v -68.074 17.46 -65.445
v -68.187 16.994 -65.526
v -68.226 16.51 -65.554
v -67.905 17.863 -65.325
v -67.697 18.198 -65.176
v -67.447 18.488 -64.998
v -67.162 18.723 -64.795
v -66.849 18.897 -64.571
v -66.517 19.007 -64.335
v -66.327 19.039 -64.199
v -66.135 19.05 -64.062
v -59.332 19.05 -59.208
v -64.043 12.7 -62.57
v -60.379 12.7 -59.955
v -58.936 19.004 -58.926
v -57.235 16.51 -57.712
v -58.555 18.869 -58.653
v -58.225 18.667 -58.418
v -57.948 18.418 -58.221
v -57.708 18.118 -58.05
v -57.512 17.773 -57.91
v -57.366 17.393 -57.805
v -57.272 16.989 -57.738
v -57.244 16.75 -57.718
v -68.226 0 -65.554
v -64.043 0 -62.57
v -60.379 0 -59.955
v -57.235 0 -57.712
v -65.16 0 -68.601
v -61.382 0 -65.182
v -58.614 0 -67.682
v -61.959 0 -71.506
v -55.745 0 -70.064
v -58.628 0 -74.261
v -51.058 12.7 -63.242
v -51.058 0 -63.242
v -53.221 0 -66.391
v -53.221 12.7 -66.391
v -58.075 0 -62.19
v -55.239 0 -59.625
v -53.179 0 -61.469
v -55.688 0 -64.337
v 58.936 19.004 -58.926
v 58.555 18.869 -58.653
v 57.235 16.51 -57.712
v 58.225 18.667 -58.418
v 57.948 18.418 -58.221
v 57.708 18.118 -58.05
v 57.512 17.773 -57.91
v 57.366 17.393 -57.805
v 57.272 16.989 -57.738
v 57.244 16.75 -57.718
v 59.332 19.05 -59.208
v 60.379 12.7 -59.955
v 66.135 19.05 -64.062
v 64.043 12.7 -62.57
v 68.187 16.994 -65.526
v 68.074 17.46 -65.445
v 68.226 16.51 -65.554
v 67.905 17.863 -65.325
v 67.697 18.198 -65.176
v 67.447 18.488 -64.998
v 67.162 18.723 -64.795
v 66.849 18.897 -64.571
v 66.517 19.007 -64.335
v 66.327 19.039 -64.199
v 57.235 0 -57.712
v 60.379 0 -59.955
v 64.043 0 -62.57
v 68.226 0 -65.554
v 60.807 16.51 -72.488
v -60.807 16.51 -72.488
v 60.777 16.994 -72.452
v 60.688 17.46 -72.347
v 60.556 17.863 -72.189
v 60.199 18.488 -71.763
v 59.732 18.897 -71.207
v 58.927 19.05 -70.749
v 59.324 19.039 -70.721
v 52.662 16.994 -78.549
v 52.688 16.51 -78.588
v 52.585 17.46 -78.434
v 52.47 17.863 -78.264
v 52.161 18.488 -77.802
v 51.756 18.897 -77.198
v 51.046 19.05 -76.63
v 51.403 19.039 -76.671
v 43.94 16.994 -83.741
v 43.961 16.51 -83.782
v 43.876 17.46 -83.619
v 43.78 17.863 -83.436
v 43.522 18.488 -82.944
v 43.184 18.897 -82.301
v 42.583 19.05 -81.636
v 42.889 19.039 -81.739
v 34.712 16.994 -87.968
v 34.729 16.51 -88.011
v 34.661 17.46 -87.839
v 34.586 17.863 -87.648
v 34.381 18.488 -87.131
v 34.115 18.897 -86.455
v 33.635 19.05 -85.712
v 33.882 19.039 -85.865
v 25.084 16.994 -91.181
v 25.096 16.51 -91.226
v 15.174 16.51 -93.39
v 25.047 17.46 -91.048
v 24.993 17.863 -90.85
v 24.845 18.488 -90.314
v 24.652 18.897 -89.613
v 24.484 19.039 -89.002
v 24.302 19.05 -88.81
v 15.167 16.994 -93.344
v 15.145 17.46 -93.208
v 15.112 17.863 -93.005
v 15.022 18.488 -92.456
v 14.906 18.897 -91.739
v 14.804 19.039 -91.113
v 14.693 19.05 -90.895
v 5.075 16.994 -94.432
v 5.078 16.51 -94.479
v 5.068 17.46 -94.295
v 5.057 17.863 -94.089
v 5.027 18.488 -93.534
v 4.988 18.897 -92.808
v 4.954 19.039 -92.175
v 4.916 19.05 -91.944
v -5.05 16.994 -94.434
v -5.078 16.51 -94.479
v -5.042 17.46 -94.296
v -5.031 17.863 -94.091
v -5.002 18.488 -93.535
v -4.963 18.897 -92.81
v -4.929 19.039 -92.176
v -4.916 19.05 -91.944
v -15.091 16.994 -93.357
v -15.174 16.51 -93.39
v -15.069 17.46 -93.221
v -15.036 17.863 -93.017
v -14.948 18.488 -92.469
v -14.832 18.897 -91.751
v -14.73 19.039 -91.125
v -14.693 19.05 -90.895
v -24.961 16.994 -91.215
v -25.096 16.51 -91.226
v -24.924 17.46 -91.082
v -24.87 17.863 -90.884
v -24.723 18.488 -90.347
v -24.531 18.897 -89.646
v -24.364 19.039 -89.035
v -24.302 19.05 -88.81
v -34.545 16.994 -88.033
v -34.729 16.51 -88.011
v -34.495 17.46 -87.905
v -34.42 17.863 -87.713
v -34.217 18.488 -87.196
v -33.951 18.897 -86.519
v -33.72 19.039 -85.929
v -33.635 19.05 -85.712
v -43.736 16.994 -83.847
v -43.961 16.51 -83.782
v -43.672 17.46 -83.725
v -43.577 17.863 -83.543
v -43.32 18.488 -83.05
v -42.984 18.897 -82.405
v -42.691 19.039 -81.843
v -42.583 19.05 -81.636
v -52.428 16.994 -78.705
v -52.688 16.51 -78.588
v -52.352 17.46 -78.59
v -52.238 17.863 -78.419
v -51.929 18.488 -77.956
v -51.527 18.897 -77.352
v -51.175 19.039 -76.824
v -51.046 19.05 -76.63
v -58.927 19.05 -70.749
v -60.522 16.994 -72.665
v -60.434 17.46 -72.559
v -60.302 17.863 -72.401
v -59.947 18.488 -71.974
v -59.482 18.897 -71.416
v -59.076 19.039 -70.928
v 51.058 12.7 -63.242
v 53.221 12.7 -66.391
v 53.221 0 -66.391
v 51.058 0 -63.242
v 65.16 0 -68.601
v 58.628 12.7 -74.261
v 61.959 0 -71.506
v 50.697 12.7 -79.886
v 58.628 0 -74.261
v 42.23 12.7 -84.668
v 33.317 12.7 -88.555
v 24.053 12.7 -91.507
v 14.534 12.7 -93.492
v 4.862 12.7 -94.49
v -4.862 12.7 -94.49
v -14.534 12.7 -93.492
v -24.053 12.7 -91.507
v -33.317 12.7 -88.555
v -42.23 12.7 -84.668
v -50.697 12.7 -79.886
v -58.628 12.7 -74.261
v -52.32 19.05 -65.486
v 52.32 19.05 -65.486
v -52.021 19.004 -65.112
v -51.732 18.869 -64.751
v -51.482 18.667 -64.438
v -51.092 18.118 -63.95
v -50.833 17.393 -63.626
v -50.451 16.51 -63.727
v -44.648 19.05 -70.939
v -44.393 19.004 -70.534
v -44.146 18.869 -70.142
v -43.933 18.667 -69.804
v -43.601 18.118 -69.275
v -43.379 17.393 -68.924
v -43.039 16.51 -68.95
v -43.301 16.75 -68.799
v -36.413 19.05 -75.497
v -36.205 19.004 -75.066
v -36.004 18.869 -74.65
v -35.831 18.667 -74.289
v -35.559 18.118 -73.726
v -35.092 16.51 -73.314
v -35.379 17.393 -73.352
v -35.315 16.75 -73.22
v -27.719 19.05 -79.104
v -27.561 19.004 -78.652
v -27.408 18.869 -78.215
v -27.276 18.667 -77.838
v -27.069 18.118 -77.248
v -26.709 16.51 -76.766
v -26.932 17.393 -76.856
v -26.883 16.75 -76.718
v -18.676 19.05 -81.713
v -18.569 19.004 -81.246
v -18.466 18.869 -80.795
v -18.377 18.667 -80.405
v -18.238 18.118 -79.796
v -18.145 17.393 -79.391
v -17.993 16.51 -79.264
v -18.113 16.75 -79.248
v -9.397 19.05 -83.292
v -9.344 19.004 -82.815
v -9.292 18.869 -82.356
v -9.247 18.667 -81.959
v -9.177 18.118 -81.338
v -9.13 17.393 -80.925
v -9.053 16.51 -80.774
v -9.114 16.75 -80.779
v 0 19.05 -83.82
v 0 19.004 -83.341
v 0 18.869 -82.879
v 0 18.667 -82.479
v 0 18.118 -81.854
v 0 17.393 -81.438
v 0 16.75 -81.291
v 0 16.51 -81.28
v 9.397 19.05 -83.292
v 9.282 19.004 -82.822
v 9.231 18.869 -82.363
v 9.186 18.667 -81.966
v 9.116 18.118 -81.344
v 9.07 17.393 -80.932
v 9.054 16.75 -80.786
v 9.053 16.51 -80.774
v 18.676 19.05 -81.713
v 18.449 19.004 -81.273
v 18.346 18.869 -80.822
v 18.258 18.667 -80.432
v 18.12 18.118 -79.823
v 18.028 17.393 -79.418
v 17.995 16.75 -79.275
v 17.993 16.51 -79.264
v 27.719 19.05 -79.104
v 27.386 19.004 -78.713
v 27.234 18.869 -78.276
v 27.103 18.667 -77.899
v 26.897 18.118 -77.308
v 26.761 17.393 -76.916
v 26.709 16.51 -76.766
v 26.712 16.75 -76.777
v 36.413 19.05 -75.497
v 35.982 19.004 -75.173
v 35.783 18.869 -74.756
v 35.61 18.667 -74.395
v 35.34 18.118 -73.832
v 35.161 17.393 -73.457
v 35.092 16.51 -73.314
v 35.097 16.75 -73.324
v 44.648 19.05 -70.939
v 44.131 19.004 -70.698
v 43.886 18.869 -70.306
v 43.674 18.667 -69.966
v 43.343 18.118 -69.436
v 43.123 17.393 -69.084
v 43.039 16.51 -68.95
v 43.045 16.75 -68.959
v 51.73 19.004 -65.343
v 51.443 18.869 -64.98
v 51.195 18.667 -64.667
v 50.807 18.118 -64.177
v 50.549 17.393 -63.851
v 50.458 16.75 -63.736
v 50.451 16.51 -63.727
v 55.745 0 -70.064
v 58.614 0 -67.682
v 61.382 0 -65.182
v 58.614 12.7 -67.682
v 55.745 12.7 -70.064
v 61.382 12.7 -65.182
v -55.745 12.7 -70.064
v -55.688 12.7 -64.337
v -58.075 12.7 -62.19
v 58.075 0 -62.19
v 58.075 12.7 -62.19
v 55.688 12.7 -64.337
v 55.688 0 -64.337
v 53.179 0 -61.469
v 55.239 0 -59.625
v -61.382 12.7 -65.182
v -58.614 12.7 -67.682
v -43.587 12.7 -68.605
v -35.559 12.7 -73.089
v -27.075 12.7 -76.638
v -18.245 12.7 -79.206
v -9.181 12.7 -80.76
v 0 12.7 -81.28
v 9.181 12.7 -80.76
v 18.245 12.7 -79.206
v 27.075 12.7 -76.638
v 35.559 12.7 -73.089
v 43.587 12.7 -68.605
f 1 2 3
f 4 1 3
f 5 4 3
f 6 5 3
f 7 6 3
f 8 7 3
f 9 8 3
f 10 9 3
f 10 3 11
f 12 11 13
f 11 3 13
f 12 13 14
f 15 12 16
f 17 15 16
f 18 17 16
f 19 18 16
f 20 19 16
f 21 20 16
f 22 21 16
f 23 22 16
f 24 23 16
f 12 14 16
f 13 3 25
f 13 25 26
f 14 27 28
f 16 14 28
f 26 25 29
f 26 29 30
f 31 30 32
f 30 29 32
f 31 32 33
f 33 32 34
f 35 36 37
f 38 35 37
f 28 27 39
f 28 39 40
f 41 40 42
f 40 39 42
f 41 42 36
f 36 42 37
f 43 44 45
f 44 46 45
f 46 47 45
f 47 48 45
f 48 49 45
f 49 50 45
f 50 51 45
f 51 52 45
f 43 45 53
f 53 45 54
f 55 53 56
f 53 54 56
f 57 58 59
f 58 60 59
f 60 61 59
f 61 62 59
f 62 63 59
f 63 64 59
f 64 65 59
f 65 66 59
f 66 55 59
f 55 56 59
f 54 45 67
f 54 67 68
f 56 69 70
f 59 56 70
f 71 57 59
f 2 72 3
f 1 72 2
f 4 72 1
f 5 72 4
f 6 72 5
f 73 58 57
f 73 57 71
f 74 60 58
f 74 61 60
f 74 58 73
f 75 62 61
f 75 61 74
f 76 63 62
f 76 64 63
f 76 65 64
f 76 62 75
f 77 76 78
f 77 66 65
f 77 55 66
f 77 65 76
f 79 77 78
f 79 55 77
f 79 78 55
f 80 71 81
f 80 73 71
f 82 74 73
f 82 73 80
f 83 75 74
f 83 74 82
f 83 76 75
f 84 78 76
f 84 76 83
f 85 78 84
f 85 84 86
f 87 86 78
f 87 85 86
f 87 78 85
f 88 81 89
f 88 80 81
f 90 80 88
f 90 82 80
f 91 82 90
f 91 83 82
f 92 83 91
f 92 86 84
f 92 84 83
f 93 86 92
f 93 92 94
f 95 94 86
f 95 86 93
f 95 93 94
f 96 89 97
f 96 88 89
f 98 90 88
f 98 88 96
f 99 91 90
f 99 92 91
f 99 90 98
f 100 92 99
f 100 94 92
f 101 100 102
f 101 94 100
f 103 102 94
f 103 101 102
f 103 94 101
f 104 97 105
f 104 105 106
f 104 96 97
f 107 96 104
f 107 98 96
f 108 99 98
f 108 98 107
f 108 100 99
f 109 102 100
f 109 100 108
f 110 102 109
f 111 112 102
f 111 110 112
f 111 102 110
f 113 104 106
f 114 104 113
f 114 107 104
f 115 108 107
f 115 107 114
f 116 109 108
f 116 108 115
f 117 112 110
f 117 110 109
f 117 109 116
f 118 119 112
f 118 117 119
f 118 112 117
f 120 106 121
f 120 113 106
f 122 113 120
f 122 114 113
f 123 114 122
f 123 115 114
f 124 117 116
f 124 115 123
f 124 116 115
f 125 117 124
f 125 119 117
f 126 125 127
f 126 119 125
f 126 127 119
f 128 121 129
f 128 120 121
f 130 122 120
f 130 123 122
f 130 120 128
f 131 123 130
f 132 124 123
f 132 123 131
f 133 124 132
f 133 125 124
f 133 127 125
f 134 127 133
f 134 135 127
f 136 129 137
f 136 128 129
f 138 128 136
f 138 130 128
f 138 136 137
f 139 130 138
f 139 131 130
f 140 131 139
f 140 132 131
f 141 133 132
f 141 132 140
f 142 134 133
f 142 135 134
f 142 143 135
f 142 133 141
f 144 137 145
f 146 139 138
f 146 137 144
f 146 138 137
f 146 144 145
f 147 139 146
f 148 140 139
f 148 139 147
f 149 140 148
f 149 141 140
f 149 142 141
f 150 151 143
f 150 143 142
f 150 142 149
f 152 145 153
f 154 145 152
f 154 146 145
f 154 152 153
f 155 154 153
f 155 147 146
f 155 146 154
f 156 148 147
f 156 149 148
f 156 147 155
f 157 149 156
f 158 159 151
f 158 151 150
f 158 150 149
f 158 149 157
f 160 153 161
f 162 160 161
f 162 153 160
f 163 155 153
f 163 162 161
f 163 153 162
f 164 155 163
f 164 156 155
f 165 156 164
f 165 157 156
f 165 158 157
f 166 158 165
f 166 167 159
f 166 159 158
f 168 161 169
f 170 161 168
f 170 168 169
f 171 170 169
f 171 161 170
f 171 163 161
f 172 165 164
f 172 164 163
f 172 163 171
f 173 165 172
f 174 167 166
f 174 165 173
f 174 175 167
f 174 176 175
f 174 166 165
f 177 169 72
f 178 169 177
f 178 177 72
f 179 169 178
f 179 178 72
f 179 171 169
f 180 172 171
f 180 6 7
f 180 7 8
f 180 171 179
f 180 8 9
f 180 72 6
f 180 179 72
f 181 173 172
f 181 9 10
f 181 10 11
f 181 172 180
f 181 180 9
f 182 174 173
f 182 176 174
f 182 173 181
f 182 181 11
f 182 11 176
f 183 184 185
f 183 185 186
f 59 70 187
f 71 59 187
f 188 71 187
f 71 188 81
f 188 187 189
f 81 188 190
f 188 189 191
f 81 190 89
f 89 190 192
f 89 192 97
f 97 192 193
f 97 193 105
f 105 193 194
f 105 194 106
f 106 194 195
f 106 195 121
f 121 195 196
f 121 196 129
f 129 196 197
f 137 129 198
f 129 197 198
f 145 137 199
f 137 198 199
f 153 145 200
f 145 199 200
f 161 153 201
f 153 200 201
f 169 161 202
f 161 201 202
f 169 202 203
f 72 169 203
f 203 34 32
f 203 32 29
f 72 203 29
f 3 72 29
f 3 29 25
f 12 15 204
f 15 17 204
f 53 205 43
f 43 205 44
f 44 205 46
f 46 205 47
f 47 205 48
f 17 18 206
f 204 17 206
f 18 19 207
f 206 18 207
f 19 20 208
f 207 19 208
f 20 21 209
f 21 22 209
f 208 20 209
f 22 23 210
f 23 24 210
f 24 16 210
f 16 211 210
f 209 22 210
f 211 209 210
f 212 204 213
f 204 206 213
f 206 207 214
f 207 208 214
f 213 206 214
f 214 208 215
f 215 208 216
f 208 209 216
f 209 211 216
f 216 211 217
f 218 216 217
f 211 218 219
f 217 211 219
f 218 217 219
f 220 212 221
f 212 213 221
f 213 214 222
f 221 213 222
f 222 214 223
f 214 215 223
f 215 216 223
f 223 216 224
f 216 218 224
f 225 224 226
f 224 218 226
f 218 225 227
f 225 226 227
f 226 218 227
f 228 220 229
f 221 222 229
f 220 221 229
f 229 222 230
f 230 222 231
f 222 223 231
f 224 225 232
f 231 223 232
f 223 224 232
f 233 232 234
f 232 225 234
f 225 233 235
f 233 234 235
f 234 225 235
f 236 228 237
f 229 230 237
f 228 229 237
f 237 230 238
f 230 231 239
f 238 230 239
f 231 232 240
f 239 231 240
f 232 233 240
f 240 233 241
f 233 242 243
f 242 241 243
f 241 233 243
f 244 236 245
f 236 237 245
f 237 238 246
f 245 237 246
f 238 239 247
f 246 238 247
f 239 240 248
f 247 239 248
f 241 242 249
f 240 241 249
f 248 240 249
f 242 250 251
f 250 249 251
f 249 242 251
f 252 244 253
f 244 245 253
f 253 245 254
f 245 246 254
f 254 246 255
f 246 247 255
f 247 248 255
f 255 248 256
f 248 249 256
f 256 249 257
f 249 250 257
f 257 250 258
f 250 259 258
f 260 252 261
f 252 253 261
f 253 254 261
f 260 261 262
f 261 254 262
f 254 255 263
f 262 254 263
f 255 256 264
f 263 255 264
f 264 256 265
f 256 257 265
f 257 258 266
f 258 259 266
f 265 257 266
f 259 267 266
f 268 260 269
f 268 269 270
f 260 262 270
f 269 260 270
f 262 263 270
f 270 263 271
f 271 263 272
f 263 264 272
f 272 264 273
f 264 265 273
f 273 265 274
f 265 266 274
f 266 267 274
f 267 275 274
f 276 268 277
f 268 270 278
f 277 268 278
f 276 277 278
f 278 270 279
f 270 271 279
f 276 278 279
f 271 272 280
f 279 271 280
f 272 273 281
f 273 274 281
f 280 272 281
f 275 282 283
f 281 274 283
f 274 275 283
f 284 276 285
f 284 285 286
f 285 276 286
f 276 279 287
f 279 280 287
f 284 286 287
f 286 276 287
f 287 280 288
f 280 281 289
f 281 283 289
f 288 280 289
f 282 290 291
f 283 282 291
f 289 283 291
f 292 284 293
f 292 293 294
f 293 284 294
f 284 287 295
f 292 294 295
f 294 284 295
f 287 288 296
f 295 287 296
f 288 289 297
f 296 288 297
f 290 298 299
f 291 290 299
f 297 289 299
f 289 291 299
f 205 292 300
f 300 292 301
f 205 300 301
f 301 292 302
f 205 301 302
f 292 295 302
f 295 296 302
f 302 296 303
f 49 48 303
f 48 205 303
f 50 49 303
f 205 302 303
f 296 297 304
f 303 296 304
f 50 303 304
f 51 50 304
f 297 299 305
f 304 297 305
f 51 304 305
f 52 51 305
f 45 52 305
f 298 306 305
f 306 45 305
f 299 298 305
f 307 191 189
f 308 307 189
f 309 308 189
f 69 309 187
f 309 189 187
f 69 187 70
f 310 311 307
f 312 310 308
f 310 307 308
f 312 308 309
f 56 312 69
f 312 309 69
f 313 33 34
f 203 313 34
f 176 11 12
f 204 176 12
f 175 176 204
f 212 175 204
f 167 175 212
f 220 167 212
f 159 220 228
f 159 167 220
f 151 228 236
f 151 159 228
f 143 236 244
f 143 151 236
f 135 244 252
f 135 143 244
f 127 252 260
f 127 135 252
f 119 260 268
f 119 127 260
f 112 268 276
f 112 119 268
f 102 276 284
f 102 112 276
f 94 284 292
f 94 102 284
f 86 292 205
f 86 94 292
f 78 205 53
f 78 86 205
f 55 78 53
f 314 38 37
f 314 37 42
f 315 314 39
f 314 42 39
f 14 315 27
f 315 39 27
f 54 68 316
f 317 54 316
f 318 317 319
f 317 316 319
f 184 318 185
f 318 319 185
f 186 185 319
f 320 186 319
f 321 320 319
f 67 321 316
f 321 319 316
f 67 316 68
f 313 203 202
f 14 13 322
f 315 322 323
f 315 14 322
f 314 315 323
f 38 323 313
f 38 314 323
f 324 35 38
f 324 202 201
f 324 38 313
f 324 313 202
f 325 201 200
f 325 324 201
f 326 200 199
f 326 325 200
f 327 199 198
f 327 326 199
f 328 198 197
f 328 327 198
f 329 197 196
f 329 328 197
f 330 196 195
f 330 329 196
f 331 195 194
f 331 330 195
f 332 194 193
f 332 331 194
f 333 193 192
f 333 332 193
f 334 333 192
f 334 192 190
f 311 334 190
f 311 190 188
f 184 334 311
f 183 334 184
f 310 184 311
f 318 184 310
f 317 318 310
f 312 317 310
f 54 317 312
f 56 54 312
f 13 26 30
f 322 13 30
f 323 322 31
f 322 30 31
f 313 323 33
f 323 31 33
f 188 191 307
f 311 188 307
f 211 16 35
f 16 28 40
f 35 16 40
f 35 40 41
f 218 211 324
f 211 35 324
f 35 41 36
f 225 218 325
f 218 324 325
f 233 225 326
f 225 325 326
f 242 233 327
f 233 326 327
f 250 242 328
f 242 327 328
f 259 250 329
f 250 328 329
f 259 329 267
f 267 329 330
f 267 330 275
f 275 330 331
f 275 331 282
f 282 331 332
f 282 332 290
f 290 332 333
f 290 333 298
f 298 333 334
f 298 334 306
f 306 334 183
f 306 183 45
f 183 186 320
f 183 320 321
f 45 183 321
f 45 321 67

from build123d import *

# Parameters (mm, degrees)
BOSS_EXTRUDE1_DEPTH = 19.05
CUT_EXTRUDE1_DEPTH  = 12.7
FILLET1_R           = 2.54
CUT_EXTRUDE2_DEPTH  = 12.7


with BuildPart() as part:
    # Sketch1 → Boss-Extrude1 (new body)
    with BuildSketch(Plane(origin=(0, 0, 0), x_dir=(1, 0, 0), z_dir=(0, 1, 0))):
        with BuildLine():
            Line((57.234735331, 57.711554056), (68.22559355, 65.553540024))
            ThreePointArc((68.22559355, 65.553540024), (0, 94.615), (-68.22559355, 65.553540024))
            Line((-68.22559355, 65.553540024), (-57.234735331, 57.711554056))
            ThreePointArc((-57.234735331, 57.711554056), (0, 81.28), (57.234735331, 57.711554056))
        make_face()
    extrude(amount=BOSS_EXTRUDE1_DEPTH)

    # Sketch3 → Cut-Extrude1 (cut)
    with BuildSketch(Plane.XZ):
        with BuildLine():
            Line((-60.379405736, -59.955278859), (-64.043453365, -62.569579718))
            ThreePointArc((-64.043453365, -62.569579718), (0, -89.535), (64.043453365, -62.569579718))
            Line((64.043453365, -62.569579718), (60.379405736, -59.955278859))
            ThreePointArc((60.379405736, -59.955278859), (0, -85.09), (-60.379405736, -59.955278859))
        make_face()
    extrude(amount=-CUT_EXTRUDE1_DEPTH, mode=Mode.SUBTRACT)

    # Fillet1
    fillet1_edges = [part.edges().sort_by_distance(p)[0] for p in [
        (0, 19.05, -81.28),
        (0, 19.05, -94.615),
    ]]
    fillet(fillet1_edges, radius=FILLET1_R)

    # Sketch5 → Cut-Extrude2 (cut)
    with BuildSketch(Plane(origin=(0, 0, 0), x_dir=(-1, 0, 0), z_dir=(0, 1, 0))):
        with BuildLine():
            ThreePointArc((-49.614735331, -61.142175608), (0, -78.74), (49.614735331, -61.142175608))
            Line((49.614735331, -61.142175608), (58.988817486, -74.785572884))
            ThreePointArc((58.988817486, -74.785572884), (0, -95.25), (-58.988817486, -74.785572884))
            Line((-58.988817486, -74.785572884), (-49.614735331, -61.142175608))
        make_face()
    extrude(amount=CUT_EXTRUDE2_DEPTH, mode=Mode.SUBTRACT)


solid = part.part
